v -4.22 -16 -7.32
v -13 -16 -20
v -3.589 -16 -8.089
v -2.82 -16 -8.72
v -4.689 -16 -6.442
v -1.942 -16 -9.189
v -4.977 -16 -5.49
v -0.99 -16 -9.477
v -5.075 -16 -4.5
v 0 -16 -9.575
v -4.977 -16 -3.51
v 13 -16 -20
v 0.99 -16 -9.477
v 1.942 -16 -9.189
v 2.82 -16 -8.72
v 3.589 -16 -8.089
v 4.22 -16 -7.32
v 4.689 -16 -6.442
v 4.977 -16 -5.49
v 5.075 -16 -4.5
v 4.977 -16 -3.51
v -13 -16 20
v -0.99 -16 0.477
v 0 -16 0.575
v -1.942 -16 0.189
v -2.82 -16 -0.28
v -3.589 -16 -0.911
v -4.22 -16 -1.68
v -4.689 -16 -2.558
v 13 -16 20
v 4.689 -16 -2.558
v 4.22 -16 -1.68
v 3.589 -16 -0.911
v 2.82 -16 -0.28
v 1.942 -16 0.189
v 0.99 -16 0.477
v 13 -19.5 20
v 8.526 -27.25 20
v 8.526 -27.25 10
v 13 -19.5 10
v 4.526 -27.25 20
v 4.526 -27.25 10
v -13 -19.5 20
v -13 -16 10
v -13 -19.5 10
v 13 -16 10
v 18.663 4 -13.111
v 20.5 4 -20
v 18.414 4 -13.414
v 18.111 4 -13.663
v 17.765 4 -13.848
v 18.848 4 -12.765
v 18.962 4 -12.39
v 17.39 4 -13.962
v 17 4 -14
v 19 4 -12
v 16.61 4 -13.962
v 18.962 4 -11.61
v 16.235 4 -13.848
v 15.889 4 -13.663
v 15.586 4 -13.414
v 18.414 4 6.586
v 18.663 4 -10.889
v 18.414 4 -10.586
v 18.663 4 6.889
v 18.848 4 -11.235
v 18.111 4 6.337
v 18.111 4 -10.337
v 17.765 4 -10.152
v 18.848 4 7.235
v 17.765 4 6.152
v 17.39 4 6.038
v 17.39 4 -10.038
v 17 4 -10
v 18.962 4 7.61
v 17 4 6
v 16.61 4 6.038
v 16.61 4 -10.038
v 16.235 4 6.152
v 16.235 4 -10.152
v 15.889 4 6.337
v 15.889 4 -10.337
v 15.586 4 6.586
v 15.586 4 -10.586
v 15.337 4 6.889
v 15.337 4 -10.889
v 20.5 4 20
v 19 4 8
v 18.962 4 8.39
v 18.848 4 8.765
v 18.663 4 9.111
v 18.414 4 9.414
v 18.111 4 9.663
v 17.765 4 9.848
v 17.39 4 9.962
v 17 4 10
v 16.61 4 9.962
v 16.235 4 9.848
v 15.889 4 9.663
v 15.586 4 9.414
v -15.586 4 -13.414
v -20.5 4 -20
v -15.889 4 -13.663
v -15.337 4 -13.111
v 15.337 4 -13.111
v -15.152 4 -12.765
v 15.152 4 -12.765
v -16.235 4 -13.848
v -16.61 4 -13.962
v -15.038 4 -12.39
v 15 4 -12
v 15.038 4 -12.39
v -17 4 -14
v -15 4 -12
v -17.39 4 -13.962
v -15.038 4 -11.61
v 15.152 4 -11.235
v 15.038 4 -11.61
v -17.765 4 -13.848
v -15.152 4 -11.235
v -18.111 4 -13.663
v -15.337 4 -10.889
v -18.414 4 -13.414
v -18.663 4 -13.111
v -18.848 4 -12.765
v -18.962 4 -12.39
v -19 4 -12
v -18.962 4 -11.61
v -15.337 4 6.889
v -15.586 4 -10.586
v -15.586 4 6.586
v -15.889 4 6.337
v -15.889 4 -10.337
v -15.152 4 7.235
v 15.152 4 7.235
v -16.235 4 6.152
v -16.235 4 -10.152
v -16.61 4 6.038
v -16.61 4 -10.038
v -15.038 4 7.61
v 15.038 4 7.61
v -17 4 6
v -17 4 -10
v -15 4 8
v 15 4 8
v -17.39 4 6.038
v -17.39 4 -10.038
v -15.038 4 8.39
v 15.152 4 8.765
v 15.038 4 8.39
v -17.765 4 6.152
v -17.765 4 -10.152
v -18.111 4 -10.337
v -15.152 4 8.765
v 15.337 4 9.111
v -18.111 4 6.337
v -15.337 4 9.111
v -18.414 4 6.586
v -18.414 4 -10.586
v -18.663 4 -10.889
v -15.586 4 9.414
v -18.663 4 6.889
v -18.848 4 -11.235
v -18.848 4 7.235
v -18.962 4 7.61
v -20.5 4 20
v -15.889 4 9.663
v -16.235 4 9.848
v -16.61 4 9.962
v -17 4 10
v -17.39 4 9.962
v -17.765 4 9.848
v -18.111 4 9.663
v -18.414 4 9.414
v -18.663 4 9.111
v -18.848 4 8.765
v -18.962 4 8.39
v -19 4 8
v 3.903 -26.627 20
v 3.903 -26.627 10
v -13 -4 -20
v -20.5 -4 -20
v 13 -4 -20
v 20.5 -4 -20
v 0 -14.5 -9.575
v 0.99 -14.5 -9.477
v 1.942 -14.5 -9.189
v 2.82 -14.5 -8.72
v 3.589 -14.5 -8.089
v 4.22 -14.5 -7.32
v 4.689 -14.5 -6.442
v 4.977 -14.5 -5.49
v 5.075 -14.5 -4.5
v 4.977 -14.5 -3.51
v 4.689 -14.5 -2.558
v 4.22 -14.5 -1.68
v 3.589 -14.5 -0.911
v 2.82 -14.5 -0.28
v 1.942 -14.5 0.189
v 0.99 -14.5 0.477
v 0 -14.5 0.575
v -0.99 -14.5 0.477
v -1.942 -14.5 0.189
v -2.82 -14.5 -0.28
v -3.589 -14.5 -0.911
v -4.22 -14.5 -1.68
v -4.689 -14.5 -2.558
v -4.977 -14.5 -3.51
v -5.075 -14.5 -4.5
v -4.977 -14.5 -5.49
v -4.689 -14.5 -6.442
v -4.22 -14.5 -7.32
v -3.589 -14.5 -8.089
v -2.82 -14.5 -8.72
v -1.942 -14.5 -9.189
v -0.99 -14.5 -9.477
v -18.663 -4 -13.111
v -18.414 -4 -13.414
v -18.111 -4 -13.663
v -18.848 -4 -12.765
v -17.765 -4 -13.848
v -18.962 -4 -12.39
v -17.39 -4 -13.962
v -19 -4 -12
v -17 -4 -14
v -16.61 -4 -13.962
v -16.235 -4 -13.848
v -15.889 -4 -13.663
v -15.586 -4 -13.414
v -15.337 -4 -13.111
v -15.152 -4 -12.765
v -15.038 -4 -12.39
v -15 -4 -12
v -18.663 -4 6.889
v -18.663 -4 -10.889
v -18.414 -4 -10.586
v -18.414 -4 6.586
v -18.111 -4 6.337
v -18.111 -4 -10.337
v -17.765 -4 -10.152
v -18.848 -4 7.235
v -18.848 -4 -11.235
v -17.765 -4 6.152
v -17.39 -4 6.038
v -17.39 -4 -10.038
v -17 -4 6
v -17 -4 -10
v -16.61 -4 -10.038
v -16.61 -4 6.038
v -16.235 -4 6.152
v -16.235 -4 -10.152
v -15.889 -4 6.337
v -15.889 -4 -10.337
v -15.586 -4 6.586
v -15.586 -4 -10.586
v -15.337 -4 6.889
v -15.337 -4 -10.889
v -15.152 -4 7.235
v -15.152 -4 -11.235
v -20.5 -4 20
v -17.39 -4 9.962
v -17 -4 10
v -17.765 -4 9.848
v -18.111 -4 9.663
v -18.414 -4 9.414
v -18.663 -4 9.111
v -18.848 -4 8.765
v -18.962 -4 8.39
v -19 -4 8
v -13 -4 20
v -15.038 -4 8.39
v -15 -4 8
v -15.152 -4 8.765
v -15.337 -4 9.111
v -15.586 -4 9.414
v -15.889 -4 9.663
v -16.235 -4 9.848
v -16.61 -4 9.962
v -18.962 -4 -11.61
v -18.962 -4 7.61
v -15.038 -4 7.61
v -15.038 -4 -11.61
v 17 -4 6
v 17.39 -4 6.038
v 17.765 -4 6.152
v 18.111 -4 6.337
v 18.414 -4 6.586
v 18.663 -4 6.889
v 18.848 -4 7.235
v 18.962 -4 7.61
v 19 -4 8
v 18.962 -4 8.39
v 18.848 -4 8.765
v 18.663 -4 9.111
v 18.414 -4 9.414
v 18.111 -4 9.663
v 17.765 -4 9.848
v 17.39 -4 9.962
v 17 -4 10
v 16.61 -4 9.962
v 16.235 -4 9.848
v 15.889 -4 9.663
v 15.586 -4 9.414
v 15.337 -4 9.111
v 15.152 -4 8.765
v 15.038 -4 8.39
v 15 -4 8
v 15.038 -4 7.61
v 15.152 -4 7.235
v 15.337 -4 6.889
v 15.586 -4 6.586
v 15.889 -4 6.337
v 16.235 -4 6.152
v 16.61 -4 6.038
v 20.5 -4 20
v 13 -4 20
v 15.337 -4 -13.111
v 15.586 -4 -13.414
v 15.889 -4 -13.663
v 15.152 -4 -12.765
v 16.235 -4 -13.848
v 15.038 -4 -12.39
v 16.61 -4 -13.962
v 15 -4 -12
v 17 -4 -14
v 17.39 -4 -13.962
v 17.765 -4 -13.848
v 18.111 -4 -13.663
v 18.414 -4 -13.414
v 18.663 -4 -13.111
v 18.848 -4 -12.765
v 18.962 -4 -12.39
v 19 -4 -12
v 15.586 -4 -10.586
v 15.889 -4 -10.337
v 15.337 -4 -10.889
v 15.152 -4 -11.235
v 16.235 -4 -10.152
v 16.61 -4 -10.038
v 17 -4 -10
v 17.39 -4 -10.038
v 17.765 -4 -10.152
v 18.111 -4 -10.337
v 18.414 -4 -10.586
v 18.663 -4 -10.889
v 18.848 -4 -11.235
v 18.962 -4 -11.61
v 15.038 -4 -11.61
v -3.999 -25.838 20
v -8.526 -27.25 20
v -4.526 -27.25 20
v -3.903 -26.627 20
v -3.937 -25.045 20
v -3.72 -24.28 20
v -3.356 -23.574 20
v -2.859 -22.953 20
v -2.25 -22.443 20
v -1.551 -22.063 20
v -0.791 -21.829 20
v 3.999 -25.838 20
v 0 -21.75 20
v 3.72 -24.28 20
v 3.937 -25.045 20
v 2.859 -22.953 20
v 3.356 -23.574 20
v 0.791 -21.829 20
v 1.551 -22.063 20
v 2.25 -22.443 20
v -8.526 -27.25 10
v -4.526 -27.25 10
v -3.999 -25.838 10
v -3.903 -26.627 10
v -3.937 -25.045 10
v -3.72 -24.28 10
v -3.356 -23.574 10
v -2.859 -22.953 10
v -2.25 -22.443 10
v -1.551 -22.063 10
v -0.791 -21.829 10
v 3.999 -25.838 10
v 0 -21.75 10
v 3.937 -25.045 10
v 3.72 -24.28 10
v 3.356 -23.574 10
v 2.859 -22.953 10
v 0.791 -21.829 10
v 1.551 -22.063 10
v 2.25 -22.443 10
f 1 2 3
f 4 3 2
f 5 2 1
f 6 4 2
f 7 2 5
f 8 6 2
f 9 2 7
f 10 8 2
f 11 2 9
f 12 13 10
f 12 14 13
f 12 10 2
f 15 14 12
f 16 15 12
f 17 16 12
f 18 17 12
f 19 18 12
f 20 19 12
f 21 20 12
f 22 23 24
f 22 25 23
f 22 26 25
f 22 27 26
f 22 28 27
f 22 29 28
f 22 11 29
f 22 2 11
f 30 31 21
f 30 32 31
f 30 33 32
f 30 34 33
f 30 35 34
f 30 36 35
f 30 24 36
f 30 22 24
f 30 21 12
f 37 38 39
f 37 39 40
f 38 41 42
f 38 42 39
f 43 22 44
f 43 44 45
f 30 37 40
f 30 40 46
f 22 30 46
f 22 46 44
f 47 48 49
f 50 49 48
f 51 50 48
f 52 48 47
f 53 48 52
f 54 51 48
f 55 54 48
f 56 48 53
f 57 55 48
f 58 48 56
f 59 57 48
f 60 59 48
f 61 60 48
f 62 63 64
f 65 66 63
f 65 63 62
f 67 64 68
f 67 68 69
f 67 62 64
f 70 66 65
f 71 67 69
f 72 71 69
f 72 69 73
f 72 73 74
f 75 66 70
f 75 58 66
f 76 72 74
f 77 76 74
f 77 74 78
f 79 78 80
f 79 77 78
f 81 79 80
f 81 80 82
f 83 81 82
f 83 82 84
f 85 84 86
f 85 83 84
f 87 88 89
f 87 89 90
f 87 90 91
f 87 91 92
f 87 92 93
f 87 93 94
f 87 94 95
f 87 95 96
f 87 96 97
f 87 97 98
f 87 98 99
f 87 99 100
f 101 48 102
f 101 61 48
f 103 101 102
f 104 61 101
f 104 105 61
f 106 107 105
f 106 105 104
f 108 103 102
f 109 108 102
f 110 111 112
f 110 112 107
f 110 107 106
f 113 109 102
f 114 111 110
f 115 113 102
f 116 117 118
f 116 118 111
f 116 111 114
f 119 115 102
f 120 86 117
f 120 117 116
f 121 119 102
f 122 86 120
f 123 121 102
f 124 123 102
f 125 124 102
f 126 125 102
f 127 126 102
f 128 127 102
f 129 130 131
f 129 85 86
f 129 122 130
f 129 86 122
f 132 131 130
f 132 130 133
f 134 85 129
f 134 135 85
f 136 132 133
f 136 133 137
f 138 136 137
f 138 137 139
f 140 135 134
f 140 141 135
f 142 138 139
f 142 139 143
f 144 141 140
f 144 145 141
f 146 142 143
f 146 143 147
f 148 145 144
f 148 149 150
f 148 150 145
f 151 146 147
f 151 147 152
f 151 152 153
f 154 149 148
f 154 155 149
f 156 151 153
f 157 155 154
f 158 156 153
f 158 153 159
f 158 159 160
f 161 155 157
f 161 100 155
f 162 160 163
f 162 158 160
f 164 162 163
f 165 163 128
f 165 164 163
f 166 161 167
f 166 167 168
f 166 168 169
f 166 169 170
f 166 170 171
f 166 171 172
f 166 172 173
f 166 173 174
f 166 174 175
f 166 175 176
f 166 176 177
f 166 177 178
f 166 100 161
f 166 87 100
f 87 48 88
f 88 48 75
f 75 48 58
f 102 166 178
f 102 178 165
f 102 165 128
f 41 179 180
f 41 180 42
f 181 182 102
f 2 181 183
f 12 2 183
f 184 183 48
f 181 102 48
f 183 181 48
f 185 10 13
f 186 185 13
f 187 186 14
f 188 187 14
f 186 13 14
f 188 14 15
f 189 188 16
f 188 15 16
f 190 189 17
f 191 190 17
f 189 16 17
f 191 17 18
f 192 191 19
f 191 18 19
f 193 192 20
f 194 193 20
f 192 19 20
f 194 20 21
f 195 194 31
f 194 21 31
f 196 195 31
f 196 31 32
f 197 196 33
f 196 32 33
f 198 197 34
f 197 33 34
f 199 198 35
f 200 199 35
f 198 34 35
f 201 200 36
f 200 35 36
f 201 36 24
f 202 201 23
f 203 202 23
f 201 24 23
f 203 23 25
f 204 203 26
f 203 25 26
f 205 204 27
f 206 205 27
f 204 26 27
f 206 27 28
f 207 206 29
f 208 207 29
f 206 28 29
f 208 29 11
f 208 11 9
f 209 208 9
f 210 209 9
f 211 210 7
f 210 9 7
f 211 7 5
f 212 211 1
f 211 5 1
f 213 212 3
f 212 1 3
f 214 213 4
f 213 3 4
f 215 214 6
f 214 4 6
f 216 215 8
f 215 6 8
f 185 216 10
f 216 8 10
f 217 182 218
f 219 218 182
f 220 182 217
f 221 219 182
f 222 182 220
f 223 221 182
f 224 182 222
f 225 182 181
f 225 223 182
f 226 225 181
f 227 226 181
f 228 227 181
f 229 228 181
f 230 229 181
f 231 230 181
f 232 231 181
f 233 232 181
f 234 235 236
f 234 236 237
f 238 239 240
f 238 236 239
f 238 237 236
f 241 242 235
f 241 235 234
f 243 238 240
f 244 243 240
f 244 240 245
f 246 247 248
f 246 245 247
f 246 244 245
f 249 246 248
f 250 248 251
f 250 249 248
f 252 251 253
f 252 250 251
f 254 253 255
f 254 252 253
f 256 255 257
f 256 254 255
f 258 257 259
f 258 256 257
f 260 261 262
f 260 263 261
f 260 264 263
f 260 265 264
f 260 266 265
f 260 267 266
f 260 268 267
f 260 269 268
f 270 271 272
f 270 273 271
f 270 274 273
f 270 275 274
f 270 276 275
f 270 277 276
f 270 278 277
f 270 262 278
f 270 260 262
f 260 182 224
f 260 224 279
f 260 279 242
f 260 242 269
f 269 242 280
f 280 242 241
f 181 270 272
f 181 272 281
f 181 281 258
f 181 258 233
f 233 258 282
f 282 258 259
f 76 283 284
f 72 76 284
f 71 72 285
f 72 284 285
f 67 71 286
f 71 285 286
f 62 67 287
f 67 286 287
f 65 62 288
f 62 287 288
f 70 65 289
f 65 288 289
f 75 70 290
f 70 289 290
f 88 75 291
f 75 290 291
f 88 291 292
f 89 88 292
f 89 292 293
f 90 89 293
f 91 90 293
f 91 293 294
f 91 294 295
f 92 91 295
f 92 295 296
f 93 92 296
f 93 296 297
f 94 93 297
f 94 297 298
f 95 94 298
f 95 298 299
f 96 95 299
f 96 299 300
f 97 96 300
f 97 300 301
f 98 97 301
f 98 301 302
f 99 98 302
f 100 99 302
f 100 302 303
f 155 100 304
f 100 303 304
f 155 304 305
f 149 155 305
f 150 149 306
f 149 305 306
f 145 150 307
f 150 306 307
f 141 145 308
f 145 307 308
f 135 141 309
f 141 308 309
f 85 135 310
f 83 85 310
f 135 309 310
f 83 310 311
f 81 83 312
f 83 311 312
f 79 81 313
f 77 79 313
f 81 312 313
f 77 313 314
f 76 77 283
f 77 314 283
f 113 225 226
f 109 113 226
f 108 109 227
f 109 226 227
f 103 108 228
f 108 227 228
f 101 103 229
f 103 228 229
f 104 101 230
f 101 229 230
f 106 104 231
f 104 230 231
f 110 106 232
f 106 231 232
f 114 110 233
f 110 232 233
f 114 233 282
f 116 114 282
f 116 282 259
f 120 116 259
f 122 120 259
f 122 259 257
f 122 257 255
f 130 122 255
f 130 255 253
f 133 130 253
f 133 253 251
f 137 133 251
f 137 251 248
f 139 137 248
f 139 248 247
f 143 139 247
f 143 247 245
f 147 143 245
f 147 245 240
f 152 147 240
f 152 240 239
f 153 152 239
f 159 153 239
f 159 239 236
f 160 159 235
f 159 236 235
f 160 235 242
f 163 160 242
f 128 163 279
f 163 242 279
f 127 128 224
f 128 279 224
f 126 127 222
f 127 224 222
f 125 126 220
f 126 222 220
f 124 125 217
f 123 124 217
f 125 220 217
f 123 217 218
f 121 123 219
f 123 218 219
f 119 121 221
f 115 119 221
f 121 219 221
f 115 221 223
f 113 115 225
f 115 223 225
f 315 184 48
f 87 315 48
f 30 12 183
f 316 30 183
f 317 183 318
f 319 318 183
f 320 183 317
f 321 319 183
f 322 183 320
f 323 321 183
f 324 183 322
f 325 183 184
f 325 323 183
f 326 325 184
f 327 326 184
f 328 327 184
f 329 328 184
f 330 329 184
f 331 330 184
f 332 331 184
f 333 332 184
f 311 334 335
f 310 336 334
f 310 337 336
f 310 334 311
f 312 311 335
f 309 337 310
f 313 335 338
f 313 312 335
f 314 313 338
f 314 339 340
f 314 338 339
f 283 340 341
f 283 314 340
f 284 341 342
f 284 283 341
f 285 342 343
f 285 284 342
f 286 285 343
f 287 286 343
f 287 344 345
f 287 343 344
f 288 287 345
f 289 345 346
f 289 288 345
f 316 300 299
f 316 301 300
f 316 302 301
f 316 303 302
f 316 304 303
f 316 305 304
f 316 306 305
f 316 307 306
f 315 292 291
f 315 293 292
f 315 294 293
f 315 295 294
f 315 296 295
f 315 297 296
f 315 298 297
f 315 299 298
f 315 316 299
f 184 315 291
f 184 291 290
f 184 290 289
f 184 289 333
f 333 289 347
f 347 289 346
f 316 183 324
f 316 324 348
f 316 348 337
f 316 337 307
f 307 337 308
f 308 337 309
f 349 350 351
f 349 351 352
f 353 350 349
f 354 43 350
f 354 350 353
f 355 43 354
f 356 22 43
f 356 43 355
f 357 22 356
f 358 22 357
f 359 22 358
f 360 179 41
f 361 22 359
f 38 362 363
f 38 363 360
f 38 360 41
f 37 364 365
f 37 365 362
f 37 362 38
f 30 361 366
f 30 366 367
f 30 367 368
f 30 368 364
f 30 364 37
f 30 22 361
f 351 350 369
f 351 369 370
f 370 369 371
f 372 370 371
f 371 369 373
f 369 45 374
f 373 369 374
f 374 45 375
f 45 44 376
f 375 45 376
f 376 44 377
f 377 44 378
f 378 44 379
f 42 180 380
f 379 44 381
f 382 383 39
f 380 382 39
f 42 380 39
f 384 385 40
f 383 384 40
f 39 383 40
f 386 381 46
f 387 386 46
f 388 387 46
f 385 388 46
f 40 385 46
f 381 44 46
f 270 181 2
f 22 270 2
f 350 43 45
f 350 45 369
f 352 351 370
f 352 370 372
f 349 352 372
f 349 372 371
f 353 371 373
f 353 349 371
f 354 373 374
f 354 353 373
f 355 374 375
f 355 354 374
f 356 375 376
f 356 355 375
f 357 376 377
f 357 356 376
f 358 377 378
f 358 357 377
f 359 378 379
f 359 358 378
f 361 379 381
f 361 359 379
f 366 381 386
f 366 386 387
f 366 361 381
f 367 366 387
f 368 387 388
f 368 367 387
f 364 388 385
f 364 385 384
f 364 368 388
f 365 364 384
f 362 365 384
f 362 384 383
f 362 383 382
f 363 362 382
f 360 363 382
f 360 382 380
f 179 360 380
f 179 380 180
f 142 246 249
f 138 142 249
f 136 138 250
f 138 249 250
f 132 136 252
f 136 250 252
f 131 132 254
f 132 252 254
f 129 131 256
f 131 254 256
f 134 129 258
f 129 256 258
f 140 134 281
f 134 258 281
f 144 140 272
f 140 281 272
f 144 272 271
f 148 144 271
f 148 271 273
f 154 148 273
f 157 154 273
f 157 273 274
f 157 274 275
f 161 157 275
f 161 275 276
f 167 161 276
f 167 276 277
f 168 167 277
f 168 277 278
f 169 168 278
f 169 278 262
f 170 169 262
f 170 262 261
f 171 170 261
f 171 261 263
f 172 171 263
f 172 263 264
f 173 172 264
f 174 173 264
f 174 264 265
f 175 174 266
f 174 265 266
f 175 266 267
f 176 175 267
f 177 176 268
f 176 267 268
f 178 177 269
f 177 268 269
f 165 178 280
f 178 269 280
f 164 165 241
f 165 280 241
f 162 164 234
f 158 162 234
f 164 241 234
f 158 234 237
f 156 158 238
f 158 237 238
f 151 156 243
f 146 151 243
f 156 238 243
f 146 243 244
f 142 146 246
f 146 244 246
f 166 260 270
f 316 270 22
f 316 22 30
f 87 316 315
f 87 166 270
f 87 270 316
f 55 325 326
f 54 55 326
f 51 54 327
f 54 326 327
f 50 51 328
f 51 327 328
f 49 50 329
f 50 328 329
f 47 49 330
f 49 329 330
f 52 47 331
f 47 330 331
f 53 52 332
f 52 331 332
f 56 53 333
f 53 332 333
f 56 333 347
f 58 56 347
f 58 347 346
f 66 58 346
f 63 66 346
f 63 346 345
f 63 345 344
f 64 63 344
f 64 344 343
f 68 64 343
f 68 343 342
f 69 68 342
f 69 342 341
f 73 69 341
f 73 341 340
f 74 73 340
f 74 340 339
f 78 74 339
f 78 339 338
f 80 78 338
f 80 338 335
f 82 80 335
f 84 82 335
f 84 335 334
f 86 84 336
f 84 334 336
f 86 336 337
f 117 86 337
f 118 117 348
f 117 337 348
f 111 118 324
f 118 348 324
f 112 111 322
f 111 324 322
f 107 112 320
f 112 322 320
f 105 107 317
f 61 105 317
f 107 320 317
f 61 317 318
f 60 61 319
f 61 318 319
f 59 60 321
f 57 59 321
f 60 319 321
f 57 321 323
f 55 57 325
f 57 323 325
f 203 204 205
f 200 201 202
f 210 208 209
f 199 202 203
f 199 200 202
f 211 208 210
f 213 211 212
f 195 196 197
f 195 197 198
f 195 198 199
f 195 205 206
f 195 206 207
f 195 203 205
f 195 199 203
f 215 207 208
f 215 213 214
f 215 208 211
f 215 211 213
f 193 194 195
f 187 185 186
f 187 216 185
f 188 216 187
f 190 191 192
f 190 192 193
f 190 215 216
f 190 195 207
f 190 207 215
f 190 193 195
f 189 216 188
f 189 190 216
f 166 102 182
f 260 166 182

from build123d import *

# Parameters (mm, degrees)
BOSS_EXTRUDE1_DEPTH = 20
SKETCH2_R           = 2
CUT_EXTRUDE1_DEPTH  = 10
SKETCH3_R           = 5.075
CUT_EXTRUDE2_DEPTH  = 1.5
BOSS_EXTRUDE3_DEPTH = 10


with BuildPart() as part:
    # Sketch1 → Boss-Extrude1 (new, symmetric)
    with BuildSketch(Plane.XY):
        Polygon((13, -4), (20.5, -4), (20.5, 4), (-20.5, 4), (-20.5, -4), (-13, -4), (-13, -16), (13, -16), align=None)
    extrude(amount=BOSS_EXTRUDE1_DEPTH, both=True)

    # Sketch2 → Cut-Extrude1 (cut)
    with BuildSketch(Plane.XZ.offset(4)):
        with Locations(Location((-17, -12, 0), (0, 0, 270))):
            Circle(SKETCH2_R)
        with Locations(Location((-17, 8, 0), (0, 0, 270))):
            Circle(SKETCH2_R)
        with Locations(Location((17, -12, 0), (0, 0, 270))):
            Circle(SKETCH2_R)
        with Locations(Location((17, 8, 0), (0, 0, 270))):
            Circle(SKETCH2_R)
    extrude(amount=-CUT_EXTRUDE1_DEPTH, mode=Mode.SUBTRACT)

    # Sketch3 → Cut-Extrude2 (cut)
    with BuildSketch(Plane.XZ.offset(16)):
        with Locations(Location((0, -4.5, 0), (0, 0, 270))):
            Circle(SKETCH3_R)
    extrude(amount=-CUT_EXTRUDE2_DEPTH, mode=Mode.SUBTRACT)


with BuildPart() as body_2:
    # Sketch6 → Boss-Extrude3 (new body)
    with BuildSketch(Plane.XY.offset(20)):
        with BuildLine():
            Line((13, -16), (-13, -16))
            Line((-13, -16), (-13, -19.5))
            Line((-13, -19.5), (-8.525535414, -27.25))
            Line((-8.525535414, -27.25), (-4.525535414, -27.25))
            Line((-4.525535414, -27.25), (-3.902649266, -26.627113852))
            ThreePointArc((-3.902649266, -26.627113852), (0, -21.75), (3.902649266, -26.627113852))
            Line((3.902649266, -26.627113852), (4.525535414, -27.25))
            Line((4.525535414, -27.25), (8.525535414, -27.25))
            Line((8.525535414, -27.25), (13, -19.5))
            Line((13, -19.5), (13, -16))
        make_face()
    extrude(amount=-BOSS_EXTRUDE3_DEPTH)


solid = Compound([part.part, body_2.part])
